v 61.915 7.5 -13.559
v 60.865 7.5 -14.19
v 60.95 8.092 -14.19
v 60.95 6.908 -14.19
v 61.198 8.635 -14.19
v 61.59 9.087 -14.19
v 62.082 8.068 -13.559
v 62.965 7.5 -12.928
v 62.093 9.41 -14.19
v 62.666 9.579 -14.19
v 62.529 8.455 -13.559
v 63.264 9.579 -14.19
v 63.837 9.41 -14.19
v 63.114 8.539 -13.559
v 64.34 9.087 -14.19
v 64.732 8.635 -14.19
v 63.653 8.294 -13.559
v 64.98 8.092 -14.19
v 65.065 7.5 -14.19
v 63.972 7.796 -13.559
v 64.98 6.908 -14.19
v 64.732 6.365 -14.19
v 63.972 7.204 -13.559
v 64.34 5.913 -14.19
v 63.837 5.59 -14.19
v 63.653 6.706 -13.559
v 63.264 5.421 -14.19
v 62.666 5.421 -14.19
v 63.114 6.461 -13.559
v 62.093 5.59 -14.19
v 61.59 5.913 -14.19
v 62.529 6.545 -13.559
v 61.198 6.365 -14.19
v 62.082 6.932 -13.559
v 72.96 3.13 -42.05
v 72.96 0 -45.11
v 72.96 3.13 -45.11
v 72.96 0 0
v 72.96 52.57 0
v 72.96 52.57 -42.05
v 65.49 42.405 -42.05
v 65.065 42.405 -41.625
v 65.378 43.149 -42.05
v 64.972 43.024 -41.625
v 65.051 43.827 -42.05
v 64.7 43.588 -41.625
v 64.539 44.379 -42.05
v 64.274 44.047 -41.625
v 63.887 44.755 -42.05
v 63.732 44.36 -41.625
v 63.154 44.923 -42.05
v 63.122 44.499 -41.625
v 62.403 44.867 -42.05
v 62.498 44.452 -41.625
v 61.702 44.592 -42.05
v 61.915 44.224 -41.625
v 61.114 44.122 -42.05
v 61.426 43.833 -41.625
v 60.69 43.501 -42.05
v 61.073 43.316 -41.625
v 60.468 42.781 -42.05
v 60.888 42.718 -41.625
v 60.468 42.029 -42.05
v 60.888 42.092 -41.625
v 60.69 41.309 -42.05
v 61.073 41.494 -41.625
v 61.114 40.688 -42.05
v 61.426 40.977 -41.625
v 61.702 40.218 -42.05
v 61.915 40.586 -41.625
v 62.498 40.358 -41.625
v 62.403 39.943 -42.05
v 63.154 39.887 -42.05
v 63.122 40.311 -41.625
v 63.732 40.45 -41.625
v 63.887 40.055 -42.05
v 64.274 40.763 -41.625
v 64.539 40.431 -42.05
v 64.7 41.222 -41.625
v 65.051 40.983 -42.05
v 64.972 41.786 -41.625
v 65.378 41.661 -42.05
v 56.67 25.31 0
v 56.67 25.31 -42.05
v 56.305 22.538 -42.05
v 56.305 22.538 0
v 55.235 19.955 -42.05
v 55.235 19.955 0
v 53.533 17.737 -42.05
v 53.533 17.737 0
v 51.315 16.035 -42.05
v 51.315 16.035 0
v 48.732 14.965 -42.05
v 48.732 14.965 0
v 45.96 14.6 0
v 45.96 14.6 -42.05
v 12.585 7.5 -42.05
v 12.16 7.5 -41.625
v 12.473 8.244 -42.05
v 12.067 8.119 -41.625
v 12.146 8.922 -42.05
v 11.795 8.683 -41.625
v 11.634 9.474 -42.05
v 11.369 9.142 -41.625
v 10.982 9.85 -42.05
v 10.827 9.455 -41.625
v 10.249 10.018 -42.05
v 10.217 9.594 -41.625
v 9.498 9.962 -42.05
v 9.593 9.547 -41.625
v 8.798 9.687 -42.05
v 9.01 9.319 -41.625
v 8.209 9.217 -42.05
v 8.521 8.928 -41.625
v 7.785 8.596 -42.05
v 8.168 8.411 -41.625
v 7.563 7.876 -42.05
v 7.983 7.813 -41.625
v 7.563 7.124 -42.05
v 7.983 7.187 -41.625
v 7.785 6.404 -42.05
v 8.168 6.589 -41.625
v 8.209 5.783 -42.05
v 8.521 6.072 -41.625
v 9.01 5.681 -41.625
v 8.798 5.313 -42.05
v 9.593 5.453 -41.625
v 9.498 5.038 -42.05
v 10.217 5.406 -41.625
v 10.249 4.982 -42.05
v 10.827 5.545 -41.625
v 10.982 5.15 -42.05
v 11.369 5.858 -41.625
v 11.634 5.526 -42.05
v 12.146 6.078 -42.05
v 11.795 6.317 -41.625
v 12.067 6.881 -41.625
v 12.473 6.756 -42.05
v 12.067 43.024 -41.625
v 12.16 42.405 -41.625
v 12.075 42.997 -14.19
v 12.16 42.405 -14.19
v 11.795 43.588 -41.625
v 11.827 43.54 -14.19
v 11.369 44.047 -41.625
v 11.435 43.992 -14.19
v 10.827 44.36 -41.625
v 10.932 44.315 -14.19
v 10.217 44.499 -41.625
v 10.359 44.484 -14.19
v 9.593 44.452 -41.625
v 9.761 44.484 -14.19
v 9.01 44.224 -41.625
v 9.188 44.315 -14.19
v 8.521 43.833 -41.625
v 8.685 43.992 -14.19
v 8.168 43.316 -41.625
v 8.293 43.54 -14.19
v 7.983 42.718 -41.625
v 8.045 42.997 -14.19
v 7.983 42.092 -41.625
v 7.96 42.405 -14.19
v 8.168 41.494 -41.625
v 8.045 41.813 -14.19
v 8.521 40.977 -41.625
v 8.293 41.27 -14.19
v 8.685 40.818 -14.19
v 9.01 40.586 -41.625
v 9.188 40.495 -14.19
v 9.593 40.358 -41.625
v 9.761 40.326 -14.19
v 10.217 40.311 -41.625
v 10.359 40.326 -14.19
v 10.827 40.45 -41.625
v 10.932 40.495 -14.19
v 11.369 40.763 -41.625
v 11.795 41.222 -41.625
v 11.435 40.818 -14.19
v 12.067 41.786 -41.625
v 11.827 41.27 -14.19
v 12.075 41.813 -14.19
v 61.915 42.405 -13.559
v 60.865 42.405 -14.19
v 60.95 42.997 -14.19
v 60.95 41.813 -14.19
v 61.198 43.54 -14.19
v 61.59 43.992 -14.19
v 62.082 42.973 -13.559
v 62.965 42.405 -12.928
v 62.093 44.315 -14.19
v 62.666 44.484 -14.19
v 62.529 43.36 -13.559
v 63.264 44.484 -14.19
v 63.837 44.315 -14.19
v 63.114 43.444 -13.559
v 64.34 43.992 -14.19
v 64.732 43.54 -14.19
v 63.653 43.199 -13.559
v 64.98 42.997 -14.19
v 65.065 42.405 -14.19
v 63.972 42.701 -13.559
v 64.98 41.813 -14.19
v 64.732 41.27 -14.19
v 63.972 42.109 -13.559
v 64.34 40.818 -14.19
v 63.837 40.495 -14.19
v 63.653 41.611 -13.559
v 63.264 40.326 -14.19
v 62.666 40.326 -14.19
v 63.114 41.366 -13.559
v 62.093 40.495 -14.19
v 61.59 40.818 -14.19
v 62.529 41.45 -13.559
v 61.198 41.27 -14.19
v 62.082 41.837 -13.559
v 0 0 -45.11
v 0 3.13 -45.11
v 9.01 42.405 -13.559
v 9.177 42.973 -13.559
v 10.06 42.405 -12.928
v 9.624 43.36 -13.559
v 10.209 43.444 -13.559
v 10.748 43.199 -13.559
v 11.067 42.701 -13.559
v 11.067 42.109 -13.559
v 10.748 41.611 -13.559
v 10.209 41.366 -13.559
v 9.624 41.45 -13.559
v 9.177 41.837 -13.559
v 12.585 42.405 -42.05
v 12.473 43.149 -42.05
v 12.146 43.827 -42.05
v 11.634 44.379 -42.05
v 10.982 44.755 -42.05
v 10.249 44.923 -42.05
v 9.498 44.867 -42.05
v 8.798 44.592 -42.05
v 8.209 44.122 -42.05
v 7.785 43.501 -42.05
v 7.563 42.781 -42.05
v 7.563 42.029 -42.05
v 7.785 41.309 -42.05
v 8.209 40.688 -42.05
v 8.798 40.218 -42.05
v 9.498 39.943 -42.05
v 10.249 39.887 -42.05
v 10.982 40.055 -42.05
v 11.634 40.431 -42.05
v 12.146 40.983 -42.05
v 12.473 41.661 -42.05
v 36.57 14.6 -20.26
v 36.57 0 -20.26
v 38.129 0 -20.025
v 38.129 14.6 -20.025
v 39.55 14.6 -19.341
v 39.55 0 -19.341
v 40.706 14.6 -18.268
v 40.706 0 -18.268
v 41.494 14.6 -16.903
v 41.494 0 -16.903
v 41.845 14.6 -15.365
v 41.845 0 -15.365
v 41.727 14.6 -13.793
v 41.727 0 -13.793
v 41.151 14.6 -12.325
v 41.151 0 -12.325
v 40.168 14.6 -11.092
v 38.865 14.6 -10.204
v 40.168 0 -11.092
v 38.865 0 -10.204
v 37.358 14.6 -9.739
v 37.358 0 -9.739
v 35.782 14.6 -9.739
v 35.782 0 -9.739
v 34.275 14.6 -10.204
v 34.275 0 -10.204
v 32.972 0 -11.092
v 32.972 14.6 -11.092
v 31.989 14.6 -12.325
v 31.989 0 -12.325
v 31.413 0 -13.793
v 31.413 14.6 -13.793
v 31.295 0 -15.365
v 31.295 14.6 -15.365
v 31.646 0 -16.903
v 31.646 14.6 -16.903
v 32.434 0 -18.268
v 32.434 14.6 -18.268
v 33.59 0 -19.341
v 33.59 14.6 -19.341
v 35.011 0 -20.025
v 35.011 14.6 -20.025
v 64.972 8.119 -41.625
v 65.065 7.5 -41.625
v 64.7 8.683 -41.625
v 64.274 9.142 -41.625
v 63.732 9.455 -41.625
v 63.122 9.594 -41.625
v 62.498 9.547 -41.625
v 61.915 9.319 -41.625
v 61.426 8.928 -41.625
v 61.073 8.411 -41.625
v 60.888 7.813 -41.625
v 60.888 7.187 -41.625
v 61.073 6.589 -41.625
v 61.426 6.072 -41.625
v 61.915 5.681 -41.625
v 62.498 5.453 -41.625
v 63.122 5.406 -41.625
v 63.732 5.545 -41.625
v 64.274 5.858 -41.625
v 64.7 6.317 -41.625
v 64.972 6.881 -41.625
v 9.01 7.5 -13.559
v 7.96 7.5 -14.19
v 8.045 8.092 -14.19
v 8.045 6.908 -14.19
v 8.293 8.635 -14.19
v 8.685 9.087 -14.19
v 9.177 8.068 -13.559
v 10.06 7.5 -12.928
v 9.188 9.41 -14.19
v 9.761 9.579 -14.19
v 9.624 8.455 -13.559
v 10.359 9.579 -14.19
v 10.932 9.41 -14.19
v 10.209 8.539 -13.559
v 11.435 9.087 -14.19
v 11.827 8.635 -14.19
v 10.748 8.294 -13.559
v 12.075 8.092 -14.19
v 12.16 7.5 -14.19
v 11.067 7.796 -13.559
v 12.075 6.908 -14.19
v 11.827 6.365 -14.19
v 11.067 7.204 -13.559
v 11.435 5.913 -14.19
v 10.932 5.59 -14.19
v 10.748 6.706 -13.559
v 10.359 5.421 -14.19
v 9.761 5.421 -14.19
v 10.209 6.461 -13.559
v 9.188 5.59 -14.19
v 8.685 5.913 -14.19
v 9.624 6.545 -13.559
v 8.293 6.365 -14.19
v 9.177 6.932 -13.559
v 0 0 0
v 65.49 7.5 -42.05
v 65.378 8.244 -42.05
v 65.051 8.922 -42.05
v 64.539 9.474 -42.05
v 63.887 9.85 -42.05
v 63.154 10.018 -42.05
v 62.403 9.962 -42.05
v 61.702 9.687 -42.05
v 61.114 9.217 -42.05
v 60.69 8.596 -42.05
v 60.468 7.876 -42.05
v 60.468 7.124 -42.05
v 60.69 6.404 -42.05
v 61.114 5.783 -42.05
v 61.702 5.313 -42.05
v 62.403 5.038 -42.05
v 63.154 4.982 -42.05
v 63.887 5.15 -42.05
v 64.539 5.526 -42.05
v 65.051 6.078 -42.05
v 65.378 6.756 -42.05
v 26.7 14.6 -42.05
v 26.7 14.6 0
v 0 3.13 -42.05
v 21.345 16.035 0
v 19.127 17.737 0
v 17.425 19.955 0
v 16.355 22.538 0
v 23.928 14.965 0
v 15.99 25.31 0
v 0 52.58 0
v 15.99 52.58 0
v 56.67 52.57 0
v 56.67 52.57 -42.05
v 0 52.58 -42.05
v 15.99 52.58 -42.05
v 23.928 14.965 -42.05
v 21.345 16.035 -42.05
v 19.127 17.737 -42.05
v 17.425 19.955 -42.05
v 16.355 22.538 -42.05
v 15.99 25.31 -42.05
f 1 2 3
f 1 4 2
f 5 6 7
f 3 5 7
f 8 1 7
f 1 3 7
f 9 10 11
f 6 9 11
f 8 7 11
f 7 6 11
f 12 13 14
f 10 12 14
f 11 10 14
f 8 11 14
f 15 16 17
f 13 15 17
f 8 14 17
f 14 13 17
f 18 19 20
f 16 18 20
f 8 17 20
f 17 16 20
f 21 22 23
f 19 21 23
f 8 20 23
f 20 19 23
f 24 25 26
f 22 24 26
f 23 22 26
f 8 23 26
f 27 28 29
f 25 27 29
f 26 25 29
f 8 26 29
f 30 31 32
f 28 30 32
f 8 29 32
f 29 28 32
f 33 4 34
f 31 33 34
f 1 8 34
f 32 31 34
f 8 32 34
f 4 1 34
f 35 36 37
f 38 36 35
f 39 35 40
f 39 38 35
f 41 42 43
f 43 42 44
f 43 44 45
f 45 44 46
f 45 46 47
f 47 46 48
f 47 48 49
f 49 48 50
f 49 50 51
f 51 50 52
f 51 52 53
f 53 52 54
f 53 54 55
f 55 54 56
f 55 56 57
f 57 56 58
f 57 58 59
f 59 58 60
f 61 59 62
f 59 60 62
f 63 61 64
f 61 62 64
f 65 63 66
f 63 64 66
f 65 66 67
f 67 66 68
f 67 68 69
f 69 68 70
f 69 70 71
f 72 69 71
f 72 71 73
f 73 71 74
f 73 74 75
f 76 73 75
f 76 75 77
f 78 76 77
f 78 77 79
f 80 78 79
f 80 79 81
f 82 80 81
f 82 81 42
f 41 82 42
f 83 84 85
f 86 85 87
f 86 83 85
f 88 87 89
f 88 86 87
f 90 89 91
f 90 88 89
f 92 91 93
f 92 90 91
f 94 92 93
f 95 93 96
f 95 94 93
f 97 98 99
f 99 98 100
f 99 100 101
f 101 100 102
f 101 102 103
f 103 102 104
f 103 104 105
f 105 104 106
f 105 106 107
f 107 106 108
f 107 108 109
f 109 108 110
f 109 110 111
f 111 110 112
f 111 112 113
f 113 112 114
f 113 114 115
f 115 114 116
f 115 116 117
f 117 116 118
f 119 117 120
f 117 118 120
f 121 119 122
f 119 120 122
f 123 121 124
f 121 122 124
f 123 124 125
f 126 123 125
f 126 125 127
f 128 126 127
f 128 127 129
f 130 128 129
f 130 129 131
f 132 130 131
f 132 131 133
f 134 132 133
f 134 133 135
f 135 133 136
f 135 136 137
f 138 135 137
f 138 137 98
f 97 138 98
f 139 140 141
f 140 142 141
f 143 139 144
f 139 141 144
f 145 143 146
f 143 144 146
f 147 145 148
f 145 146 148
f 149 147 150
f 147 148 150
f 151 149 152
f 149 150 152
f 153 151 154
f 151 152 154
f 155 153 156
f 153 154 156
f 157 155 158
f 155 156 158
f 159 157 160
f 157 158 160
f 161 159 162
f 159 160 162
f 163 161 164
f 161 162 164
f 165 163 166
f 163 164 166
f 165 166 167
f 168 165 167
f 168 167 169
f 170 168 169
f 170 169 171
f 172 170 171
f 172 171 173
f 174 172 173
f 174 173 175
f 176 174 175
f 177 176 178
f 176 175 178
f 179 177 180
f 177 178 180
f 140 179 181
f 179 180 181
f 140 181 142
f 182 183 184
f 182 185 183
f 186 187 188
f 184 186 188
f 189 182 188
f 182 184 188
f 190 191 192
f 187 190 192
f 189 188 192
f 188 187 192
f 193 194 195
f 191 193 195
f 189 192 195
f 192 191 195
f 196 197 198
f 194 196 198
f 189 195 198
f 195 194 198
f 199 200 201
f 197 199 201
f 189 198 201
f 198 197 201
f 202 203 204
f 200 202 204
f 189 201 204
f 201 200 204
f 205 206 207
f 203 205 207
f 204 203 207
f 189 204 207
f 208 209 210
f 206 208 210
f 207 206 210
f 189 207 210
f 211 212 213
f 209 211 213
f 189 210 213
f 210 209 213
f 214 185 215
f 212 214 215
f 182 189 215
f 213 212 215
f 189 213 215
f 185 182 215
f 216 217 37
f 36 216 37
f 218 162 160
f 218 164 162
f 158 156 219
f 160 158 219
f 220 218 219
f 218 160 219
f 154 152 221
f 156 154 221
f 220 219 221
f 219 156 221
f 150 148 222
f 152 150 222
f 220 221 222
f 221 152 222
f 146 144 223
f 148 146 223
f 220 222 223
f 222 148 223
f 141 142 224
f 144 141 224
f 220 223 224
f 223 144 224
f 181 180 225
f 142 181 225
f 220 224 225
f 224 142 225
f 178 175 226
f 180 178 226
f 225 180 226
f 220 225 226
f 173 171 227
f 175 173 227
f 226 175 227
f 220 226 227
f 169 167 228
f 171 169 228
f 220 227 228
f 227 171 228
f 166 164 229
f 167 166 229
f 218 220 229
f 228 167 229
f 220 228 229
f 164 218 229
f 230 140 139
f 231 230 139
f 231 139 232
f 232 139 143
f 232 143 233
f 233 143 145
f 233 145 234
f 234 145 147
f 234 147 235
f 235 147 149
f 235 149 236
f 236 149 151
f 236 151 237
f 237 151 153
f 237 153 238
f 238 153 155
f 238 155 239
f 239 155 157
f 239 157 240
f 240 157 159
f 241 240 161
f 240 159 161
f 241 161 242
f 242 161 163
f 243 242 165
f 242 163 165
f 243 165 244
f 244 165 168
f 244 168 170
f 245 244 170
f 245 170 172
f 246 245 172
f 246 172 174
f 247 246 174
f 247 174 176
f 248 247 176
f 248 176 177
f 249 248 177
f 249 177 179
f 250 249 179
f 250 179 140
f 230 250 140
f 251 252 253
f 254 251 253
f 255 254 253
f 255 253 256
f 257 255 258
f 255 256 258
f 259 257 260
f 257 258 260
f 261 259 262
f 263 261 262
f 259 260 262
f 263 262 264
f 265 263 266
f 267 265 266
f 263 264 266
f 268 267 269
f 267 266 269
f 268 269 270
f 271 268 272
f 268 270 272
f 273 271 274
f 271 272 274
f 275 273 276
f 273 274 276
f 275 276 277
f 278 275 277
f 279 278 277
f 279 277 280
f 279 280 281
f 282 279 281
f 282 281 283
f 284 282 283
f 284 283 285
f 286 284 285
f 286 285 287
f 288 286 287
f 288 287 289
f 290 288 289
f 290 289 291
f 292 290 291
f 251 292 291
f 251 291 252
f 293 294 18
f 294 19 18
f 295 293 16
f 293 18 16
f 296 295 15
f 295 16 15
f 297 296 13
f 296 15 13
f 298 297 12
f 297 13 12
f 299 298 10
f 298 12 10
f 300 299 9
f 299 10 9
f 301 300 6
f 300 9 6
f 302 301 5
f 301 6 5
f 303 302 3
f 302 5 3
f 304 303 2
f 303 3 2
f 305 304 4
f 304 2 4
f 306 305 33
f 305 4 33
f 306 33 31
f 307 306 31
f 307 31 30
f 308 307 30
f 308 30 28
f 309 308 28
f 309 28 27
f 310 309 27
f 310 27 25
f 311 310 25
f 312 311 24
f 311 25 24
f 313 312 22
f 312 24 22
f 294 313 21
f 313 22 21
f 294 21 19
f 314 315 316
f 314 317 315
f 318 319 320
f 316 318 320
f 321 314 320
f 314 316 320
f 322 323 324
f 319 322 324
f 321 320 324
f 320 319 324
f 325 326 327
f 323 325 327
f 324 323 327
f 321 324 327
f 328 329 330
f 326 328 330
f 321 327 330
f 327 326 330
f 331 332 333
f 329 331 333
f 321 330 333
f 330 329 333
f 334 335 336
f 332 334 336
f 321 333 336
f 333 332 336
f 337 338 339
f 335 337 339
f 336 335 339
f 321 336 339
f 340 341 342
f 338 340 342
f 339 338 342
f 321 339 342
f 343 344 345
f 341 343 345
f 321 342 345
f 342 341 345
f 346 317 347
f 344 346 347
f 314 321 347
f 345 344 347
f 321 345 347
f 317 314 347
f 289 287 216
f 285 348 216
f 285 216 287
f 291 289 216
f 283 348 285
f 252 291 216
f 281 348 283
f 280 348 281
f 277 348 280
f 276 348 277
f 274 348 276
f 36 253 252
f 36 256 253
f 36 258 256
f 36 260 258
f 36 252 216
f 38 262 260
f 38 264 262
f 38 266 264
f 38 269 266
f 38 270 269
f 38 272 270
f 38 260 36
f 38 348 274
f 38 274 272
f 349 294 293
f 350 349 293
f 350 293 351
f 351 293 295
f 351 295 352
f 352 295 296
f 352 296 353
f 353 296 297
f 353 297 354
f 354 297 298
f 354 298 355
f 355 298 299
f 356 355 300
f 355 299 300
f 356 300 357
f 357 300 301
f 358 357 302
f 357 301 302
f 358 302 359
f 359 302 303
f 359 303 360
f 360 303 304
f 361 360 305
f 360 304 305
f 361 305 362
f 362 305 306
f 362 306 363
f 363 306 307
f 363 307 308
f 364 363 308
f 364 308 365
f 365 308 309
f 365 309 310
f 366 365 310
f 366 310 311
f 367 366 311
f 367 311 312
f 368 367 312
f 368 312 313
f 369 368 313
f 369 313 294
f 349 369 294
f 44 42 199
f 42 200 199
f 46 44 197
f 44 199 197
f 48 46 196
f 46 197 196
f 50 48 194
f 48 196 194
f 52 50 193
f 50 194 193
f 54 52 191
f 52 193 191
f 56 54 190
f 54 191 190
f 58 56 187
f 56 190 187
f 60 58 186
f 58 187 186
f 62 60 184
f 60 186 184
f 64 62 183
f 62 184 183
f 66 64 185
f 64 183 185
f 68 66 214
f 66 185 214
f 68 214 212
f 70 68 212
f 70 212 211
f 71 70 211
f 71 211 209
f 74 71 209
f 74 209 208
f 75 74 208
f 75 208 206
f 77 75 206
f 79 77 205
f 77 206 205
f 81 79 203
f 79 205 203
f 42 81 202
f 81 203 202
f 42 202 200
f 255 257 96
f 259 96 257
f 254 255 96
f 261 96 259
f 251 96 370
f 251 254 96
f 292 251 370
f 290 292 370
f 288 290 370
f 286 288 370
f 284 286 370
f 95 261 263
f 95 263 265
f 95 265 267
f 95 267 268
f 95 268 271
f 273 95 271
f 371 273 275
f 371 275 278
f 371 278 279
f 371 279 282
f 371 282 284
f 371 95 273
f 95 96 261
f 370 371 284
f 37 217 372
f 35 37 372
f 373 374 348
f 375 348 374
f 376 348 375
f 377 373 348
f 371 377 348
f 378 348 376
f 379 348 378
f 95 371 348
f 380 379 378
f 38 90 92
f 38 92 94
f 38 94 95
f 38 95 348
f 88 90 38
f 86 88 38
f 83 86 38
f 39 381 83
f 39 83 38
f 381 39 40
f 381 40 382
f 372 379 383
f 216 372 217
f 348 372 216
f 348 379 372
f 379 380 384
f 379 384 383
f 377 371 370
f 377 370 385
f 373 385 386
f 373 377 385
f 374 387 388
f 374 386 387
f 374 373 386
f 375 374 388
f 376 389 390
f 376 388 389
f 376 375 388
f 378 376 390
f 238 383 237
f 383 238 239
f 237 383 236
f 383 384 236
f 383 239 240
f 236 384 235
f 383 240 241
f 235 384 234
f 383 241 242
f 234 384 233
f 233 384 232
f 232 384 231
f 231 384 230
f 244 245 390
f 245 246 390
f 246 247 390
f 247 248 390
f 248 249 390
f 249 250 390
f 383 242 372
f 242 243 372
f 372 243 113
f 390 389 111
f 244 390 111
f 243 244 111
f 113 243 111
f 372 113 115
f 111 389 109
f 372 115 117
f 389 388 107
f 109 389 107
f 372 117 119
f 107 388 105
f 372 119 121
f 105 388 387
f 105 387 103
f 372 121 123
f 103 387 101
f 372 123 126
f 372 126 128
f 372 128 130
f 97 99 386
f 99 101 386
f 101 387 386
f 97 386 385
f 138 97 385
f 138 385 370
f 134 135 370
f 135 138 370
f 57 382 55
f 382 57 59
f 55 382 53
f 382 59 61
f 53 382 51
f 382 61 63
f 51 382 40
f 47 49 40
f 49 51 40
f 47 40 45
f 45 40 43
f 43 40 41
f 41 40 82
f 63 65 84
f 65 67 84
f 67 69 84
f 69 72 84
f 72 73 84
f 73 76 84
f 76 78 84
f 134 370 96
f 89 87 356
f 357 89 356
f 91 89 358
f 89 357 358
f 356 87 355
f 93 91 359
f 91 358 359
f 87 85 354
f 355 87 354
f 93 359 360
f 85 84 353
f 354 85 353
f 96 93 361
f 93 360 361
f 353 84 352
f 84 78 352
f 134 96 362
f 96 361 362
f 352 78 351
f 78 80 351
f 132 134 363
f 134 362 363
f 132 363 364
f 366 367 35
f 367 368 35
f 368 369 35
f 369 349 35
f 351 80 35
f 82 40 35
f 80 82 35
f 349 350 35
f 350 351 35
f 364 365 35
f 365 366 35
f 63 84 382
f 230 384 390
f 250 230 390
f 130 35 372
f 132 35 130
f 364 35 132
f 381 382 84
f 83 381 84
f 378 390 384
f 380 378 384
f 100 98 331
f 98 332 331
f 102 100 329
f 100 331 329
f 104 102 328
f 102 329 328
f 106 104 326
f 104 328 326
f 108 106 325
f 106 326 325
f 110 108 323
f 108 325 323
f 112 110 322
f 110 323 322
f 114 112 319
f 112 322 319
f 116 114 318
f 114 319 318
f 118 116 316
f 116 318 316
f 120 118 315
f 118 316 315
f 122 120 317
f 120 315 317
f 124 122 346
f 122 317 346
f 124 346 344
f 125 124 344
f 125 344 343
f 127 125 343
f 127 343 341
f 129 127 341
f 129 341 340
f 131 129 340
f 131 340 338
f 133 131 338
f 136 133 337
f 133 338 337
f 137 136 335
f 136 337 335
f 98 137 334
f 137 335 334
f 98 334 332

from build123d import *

# Parameters (mm, degrees)
BOSS_EXTRUDE1_DEPTH             = 45.11
CUT_EXTRUDE2_DEPTH              = 100
SKETCH3_R                       = 5.29
CUT_EXTRUDE3_DEPTH              = 100
M5X0_8_TAPPED_HOLE1_D           = 4.2
M5X0_8_TAPPED_HOLE1_DEPTH       = 27.86
M5X0_8_TAPPED_HOLE1_CSINK_D     = 5.05
M5X0_8_TAPPED_HOLE1_CSINK_ANGLE = 90
M5X0_8_TAPPED_HOLE1_TIP         = 1.2618073


with BuildPart() as part:
    # Sketch1 → Boss-Extrude1 (new body)
    with BuildSketch(Plane.XY):
        with BuildLine():
            Line((0, 0), (72.96, 0))
            Line((72.96, 0), (72.96, 52.57))
            Line((72.96, 52.57), (56.67, 52.57))
            Line((56.67, 52.57), (56.67, 25.31))
            ThreePointArc((56.67, 25.31), (53.533113627, 17.736886373), (45.96, 14.6))
            Line((45.96, 14.6), (26.7, 14.6))
            ThreePointArc((26.7, 14.6), (19.126886373, 17.736886373), (15.99, 25.31))
            Line((15.99, 25.31), (15.99, 52.58))
            Line((15.99, 52.58), (0, 52.58))
            Line((0, 52.58), (0, 0))
        make_face()
    extrude(amount=-BOSS_EXTRUDE1_DEPTH)

    # Sketch2 → Cut-Extrude2 (cut)
    with BuildSketch(Plane(origin=(72.96, 0, 0), x_dir=(0, 0, -1), z_dir=(1, 0, 0))):
        Polygon((45.11, 52.57), (45.11, 3.13), (42.05, 3.13), (42.05, 52.57), (42.05, 55.677110027), (45.11, 55.677110027), align=None)
    extrude(amount=-CUT_EXTRUDE2_DEPTH, mode=Mode.SUBTRACT)

    # Sketch3 → Cut-Extrude3 (cut)
    with BuildSketch(Plane.XZ):
        with Locations(Location((36.57, -14.97, 0), (0, 0, 270))):
            Circle(SKETCH3_R)
    extrude(amount=-CUT_EXTRUDE3_DEPTH, mode=Mode.SUBTRACT)

    # M5x0.8 Tapped Hole1
    with Locations(Plane(origin=(0, 0, -42.05), x_dir=(-1, 0, 0), z_dir=(0, 0, -1))):
        with Locations((-62.965, 42.405), (-62.965, 7.5), (-10.06, 7.5), (-10.06, 42.405)):
            CounterSinkHole(M5X0_8_TAPPED_HOLE1_D / 2, M5X0_8_TAPPED_HOLE1_CSINK_D / 2, depth=M5X0_8_TAPPED_HOLE1_DEPTH, counter_sink_angle=M5X0_8_TAPPED_HOLE1_CSINK_ANGLE)
            with Locations((0, 0, -(M5X0_8_TAPPED_HOLE1_DEPTH + M5X0_8_TAPPED_HOLE1_TIP / 2))):  # 118° drill point
                Cone(0, M5X0_8_TAPPED_HOLE1_D / 2, M5X0_8_TAPPED_HOLE1_TIP, mode=Mode.SUBTRACT)


solid = part.part
